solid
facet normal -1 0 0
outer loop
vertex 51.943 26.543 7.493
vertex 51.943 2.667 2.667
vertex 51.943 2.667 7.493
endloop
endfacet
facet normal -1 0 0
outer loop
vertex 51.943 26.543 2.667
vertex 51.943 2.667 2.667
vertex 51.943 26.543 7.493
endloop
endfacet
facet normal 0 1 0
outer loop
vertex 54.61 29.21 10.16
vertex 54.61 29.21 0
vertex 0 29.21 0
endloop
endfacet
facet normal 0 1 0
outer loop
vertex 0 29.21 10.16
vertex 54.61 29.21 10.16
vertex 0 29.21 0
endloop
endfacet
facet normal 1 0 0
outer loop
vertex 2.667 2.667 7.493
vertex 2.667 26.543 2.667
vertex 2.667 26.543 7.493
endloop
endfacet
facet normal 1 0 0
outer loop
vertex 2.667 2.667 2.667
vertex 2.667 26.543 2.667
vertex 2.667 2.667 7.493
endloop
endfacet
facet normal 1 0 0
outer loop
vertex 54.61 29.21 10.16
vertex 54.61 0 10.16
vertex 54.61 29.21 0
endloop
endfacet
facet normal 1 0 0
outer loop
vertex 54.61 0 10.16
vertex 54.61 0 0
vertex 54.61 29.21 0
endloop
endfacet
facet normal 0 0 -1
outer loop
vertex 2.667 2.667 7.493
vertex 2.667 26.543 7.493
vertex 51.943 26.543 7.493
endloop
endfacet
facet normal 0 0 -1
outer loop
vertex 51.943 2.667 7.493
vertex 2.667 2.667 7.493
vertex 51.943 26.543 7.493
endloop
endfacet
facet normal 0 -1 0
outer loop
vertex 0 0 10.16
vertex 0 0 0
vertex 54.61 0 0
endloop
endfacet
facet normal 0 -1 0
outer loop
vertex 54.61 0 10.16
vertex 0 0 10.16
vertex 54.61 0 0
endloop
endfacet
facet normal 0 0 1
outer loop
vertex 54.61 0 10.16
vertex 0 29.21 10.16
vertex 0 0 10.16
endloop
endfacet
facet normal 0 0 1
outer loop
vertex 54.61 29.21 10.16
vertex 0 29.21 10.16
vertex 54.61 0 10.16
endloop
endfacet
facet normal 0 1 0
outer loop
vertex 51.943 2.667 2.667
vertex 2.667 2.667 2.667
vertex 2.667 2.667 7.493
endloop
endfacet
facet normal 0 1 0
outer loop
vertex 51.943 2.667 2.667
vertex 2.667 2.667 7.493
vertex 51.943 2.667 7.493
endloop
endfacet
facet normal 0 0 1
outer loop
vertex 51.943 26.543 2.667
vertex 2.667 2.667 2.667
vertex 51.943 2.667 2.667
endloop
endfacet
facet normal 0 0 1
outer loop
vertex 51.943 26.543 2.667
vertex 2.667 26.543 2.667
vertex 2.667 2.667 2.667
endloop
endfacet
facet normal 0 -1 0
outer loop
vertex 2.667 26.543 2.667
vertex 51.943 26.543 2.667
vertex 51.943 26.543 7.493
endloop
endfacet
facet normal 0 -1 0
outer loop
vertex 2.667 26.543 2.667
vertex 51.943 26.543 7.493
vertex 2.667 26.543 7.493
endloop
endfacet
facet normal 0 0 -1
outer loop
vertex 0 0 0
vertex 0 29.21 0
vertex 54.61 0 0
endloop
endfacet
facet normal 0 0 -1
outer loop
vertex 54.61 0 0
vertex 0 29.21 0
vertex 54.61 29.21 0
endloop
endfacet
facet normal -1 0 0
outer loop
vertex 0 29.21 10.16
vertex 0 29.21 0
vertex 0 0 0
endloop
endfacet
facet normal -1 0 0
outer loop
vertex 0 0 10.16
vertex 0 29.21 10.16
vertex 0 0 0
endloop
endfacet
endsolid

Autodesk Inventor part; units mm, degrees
ref_plane "YZ Plane" through (0, 0, 0) normal (1, 0, 0) x (0, 1, 0)
ref_plane "XZ Plane" through (0, 0, 0) normal (0, 1, 0) x (-1, 0, 0)
ref_plane "XY Plane" through (0, 0, 0) normal (0, 0, 1) x (1, 0, 0)
sketch "Sketch1" plane through (0, 0, 0) normal (0, 0, 1) x (1, 0, 0)
  line L0 (0, 0) -> (54.61, 0)
  line L1 (54.61, 0) -> (54.61, 29.21)
  line L2 (54.61, 29.21) -> (0, 29.21)
  line L3 (0, 29.21) -> (0, 0)
  dimension "d0" = 54.61
  dimension "d2" = 29.21
extrude "Extrusion1" add sketch "Sketch1" along normal blind 10.16
shell "Shell1" thickness 2.667 removed faces 0
properties part number "LiPo" material "Aluminum 6061"
